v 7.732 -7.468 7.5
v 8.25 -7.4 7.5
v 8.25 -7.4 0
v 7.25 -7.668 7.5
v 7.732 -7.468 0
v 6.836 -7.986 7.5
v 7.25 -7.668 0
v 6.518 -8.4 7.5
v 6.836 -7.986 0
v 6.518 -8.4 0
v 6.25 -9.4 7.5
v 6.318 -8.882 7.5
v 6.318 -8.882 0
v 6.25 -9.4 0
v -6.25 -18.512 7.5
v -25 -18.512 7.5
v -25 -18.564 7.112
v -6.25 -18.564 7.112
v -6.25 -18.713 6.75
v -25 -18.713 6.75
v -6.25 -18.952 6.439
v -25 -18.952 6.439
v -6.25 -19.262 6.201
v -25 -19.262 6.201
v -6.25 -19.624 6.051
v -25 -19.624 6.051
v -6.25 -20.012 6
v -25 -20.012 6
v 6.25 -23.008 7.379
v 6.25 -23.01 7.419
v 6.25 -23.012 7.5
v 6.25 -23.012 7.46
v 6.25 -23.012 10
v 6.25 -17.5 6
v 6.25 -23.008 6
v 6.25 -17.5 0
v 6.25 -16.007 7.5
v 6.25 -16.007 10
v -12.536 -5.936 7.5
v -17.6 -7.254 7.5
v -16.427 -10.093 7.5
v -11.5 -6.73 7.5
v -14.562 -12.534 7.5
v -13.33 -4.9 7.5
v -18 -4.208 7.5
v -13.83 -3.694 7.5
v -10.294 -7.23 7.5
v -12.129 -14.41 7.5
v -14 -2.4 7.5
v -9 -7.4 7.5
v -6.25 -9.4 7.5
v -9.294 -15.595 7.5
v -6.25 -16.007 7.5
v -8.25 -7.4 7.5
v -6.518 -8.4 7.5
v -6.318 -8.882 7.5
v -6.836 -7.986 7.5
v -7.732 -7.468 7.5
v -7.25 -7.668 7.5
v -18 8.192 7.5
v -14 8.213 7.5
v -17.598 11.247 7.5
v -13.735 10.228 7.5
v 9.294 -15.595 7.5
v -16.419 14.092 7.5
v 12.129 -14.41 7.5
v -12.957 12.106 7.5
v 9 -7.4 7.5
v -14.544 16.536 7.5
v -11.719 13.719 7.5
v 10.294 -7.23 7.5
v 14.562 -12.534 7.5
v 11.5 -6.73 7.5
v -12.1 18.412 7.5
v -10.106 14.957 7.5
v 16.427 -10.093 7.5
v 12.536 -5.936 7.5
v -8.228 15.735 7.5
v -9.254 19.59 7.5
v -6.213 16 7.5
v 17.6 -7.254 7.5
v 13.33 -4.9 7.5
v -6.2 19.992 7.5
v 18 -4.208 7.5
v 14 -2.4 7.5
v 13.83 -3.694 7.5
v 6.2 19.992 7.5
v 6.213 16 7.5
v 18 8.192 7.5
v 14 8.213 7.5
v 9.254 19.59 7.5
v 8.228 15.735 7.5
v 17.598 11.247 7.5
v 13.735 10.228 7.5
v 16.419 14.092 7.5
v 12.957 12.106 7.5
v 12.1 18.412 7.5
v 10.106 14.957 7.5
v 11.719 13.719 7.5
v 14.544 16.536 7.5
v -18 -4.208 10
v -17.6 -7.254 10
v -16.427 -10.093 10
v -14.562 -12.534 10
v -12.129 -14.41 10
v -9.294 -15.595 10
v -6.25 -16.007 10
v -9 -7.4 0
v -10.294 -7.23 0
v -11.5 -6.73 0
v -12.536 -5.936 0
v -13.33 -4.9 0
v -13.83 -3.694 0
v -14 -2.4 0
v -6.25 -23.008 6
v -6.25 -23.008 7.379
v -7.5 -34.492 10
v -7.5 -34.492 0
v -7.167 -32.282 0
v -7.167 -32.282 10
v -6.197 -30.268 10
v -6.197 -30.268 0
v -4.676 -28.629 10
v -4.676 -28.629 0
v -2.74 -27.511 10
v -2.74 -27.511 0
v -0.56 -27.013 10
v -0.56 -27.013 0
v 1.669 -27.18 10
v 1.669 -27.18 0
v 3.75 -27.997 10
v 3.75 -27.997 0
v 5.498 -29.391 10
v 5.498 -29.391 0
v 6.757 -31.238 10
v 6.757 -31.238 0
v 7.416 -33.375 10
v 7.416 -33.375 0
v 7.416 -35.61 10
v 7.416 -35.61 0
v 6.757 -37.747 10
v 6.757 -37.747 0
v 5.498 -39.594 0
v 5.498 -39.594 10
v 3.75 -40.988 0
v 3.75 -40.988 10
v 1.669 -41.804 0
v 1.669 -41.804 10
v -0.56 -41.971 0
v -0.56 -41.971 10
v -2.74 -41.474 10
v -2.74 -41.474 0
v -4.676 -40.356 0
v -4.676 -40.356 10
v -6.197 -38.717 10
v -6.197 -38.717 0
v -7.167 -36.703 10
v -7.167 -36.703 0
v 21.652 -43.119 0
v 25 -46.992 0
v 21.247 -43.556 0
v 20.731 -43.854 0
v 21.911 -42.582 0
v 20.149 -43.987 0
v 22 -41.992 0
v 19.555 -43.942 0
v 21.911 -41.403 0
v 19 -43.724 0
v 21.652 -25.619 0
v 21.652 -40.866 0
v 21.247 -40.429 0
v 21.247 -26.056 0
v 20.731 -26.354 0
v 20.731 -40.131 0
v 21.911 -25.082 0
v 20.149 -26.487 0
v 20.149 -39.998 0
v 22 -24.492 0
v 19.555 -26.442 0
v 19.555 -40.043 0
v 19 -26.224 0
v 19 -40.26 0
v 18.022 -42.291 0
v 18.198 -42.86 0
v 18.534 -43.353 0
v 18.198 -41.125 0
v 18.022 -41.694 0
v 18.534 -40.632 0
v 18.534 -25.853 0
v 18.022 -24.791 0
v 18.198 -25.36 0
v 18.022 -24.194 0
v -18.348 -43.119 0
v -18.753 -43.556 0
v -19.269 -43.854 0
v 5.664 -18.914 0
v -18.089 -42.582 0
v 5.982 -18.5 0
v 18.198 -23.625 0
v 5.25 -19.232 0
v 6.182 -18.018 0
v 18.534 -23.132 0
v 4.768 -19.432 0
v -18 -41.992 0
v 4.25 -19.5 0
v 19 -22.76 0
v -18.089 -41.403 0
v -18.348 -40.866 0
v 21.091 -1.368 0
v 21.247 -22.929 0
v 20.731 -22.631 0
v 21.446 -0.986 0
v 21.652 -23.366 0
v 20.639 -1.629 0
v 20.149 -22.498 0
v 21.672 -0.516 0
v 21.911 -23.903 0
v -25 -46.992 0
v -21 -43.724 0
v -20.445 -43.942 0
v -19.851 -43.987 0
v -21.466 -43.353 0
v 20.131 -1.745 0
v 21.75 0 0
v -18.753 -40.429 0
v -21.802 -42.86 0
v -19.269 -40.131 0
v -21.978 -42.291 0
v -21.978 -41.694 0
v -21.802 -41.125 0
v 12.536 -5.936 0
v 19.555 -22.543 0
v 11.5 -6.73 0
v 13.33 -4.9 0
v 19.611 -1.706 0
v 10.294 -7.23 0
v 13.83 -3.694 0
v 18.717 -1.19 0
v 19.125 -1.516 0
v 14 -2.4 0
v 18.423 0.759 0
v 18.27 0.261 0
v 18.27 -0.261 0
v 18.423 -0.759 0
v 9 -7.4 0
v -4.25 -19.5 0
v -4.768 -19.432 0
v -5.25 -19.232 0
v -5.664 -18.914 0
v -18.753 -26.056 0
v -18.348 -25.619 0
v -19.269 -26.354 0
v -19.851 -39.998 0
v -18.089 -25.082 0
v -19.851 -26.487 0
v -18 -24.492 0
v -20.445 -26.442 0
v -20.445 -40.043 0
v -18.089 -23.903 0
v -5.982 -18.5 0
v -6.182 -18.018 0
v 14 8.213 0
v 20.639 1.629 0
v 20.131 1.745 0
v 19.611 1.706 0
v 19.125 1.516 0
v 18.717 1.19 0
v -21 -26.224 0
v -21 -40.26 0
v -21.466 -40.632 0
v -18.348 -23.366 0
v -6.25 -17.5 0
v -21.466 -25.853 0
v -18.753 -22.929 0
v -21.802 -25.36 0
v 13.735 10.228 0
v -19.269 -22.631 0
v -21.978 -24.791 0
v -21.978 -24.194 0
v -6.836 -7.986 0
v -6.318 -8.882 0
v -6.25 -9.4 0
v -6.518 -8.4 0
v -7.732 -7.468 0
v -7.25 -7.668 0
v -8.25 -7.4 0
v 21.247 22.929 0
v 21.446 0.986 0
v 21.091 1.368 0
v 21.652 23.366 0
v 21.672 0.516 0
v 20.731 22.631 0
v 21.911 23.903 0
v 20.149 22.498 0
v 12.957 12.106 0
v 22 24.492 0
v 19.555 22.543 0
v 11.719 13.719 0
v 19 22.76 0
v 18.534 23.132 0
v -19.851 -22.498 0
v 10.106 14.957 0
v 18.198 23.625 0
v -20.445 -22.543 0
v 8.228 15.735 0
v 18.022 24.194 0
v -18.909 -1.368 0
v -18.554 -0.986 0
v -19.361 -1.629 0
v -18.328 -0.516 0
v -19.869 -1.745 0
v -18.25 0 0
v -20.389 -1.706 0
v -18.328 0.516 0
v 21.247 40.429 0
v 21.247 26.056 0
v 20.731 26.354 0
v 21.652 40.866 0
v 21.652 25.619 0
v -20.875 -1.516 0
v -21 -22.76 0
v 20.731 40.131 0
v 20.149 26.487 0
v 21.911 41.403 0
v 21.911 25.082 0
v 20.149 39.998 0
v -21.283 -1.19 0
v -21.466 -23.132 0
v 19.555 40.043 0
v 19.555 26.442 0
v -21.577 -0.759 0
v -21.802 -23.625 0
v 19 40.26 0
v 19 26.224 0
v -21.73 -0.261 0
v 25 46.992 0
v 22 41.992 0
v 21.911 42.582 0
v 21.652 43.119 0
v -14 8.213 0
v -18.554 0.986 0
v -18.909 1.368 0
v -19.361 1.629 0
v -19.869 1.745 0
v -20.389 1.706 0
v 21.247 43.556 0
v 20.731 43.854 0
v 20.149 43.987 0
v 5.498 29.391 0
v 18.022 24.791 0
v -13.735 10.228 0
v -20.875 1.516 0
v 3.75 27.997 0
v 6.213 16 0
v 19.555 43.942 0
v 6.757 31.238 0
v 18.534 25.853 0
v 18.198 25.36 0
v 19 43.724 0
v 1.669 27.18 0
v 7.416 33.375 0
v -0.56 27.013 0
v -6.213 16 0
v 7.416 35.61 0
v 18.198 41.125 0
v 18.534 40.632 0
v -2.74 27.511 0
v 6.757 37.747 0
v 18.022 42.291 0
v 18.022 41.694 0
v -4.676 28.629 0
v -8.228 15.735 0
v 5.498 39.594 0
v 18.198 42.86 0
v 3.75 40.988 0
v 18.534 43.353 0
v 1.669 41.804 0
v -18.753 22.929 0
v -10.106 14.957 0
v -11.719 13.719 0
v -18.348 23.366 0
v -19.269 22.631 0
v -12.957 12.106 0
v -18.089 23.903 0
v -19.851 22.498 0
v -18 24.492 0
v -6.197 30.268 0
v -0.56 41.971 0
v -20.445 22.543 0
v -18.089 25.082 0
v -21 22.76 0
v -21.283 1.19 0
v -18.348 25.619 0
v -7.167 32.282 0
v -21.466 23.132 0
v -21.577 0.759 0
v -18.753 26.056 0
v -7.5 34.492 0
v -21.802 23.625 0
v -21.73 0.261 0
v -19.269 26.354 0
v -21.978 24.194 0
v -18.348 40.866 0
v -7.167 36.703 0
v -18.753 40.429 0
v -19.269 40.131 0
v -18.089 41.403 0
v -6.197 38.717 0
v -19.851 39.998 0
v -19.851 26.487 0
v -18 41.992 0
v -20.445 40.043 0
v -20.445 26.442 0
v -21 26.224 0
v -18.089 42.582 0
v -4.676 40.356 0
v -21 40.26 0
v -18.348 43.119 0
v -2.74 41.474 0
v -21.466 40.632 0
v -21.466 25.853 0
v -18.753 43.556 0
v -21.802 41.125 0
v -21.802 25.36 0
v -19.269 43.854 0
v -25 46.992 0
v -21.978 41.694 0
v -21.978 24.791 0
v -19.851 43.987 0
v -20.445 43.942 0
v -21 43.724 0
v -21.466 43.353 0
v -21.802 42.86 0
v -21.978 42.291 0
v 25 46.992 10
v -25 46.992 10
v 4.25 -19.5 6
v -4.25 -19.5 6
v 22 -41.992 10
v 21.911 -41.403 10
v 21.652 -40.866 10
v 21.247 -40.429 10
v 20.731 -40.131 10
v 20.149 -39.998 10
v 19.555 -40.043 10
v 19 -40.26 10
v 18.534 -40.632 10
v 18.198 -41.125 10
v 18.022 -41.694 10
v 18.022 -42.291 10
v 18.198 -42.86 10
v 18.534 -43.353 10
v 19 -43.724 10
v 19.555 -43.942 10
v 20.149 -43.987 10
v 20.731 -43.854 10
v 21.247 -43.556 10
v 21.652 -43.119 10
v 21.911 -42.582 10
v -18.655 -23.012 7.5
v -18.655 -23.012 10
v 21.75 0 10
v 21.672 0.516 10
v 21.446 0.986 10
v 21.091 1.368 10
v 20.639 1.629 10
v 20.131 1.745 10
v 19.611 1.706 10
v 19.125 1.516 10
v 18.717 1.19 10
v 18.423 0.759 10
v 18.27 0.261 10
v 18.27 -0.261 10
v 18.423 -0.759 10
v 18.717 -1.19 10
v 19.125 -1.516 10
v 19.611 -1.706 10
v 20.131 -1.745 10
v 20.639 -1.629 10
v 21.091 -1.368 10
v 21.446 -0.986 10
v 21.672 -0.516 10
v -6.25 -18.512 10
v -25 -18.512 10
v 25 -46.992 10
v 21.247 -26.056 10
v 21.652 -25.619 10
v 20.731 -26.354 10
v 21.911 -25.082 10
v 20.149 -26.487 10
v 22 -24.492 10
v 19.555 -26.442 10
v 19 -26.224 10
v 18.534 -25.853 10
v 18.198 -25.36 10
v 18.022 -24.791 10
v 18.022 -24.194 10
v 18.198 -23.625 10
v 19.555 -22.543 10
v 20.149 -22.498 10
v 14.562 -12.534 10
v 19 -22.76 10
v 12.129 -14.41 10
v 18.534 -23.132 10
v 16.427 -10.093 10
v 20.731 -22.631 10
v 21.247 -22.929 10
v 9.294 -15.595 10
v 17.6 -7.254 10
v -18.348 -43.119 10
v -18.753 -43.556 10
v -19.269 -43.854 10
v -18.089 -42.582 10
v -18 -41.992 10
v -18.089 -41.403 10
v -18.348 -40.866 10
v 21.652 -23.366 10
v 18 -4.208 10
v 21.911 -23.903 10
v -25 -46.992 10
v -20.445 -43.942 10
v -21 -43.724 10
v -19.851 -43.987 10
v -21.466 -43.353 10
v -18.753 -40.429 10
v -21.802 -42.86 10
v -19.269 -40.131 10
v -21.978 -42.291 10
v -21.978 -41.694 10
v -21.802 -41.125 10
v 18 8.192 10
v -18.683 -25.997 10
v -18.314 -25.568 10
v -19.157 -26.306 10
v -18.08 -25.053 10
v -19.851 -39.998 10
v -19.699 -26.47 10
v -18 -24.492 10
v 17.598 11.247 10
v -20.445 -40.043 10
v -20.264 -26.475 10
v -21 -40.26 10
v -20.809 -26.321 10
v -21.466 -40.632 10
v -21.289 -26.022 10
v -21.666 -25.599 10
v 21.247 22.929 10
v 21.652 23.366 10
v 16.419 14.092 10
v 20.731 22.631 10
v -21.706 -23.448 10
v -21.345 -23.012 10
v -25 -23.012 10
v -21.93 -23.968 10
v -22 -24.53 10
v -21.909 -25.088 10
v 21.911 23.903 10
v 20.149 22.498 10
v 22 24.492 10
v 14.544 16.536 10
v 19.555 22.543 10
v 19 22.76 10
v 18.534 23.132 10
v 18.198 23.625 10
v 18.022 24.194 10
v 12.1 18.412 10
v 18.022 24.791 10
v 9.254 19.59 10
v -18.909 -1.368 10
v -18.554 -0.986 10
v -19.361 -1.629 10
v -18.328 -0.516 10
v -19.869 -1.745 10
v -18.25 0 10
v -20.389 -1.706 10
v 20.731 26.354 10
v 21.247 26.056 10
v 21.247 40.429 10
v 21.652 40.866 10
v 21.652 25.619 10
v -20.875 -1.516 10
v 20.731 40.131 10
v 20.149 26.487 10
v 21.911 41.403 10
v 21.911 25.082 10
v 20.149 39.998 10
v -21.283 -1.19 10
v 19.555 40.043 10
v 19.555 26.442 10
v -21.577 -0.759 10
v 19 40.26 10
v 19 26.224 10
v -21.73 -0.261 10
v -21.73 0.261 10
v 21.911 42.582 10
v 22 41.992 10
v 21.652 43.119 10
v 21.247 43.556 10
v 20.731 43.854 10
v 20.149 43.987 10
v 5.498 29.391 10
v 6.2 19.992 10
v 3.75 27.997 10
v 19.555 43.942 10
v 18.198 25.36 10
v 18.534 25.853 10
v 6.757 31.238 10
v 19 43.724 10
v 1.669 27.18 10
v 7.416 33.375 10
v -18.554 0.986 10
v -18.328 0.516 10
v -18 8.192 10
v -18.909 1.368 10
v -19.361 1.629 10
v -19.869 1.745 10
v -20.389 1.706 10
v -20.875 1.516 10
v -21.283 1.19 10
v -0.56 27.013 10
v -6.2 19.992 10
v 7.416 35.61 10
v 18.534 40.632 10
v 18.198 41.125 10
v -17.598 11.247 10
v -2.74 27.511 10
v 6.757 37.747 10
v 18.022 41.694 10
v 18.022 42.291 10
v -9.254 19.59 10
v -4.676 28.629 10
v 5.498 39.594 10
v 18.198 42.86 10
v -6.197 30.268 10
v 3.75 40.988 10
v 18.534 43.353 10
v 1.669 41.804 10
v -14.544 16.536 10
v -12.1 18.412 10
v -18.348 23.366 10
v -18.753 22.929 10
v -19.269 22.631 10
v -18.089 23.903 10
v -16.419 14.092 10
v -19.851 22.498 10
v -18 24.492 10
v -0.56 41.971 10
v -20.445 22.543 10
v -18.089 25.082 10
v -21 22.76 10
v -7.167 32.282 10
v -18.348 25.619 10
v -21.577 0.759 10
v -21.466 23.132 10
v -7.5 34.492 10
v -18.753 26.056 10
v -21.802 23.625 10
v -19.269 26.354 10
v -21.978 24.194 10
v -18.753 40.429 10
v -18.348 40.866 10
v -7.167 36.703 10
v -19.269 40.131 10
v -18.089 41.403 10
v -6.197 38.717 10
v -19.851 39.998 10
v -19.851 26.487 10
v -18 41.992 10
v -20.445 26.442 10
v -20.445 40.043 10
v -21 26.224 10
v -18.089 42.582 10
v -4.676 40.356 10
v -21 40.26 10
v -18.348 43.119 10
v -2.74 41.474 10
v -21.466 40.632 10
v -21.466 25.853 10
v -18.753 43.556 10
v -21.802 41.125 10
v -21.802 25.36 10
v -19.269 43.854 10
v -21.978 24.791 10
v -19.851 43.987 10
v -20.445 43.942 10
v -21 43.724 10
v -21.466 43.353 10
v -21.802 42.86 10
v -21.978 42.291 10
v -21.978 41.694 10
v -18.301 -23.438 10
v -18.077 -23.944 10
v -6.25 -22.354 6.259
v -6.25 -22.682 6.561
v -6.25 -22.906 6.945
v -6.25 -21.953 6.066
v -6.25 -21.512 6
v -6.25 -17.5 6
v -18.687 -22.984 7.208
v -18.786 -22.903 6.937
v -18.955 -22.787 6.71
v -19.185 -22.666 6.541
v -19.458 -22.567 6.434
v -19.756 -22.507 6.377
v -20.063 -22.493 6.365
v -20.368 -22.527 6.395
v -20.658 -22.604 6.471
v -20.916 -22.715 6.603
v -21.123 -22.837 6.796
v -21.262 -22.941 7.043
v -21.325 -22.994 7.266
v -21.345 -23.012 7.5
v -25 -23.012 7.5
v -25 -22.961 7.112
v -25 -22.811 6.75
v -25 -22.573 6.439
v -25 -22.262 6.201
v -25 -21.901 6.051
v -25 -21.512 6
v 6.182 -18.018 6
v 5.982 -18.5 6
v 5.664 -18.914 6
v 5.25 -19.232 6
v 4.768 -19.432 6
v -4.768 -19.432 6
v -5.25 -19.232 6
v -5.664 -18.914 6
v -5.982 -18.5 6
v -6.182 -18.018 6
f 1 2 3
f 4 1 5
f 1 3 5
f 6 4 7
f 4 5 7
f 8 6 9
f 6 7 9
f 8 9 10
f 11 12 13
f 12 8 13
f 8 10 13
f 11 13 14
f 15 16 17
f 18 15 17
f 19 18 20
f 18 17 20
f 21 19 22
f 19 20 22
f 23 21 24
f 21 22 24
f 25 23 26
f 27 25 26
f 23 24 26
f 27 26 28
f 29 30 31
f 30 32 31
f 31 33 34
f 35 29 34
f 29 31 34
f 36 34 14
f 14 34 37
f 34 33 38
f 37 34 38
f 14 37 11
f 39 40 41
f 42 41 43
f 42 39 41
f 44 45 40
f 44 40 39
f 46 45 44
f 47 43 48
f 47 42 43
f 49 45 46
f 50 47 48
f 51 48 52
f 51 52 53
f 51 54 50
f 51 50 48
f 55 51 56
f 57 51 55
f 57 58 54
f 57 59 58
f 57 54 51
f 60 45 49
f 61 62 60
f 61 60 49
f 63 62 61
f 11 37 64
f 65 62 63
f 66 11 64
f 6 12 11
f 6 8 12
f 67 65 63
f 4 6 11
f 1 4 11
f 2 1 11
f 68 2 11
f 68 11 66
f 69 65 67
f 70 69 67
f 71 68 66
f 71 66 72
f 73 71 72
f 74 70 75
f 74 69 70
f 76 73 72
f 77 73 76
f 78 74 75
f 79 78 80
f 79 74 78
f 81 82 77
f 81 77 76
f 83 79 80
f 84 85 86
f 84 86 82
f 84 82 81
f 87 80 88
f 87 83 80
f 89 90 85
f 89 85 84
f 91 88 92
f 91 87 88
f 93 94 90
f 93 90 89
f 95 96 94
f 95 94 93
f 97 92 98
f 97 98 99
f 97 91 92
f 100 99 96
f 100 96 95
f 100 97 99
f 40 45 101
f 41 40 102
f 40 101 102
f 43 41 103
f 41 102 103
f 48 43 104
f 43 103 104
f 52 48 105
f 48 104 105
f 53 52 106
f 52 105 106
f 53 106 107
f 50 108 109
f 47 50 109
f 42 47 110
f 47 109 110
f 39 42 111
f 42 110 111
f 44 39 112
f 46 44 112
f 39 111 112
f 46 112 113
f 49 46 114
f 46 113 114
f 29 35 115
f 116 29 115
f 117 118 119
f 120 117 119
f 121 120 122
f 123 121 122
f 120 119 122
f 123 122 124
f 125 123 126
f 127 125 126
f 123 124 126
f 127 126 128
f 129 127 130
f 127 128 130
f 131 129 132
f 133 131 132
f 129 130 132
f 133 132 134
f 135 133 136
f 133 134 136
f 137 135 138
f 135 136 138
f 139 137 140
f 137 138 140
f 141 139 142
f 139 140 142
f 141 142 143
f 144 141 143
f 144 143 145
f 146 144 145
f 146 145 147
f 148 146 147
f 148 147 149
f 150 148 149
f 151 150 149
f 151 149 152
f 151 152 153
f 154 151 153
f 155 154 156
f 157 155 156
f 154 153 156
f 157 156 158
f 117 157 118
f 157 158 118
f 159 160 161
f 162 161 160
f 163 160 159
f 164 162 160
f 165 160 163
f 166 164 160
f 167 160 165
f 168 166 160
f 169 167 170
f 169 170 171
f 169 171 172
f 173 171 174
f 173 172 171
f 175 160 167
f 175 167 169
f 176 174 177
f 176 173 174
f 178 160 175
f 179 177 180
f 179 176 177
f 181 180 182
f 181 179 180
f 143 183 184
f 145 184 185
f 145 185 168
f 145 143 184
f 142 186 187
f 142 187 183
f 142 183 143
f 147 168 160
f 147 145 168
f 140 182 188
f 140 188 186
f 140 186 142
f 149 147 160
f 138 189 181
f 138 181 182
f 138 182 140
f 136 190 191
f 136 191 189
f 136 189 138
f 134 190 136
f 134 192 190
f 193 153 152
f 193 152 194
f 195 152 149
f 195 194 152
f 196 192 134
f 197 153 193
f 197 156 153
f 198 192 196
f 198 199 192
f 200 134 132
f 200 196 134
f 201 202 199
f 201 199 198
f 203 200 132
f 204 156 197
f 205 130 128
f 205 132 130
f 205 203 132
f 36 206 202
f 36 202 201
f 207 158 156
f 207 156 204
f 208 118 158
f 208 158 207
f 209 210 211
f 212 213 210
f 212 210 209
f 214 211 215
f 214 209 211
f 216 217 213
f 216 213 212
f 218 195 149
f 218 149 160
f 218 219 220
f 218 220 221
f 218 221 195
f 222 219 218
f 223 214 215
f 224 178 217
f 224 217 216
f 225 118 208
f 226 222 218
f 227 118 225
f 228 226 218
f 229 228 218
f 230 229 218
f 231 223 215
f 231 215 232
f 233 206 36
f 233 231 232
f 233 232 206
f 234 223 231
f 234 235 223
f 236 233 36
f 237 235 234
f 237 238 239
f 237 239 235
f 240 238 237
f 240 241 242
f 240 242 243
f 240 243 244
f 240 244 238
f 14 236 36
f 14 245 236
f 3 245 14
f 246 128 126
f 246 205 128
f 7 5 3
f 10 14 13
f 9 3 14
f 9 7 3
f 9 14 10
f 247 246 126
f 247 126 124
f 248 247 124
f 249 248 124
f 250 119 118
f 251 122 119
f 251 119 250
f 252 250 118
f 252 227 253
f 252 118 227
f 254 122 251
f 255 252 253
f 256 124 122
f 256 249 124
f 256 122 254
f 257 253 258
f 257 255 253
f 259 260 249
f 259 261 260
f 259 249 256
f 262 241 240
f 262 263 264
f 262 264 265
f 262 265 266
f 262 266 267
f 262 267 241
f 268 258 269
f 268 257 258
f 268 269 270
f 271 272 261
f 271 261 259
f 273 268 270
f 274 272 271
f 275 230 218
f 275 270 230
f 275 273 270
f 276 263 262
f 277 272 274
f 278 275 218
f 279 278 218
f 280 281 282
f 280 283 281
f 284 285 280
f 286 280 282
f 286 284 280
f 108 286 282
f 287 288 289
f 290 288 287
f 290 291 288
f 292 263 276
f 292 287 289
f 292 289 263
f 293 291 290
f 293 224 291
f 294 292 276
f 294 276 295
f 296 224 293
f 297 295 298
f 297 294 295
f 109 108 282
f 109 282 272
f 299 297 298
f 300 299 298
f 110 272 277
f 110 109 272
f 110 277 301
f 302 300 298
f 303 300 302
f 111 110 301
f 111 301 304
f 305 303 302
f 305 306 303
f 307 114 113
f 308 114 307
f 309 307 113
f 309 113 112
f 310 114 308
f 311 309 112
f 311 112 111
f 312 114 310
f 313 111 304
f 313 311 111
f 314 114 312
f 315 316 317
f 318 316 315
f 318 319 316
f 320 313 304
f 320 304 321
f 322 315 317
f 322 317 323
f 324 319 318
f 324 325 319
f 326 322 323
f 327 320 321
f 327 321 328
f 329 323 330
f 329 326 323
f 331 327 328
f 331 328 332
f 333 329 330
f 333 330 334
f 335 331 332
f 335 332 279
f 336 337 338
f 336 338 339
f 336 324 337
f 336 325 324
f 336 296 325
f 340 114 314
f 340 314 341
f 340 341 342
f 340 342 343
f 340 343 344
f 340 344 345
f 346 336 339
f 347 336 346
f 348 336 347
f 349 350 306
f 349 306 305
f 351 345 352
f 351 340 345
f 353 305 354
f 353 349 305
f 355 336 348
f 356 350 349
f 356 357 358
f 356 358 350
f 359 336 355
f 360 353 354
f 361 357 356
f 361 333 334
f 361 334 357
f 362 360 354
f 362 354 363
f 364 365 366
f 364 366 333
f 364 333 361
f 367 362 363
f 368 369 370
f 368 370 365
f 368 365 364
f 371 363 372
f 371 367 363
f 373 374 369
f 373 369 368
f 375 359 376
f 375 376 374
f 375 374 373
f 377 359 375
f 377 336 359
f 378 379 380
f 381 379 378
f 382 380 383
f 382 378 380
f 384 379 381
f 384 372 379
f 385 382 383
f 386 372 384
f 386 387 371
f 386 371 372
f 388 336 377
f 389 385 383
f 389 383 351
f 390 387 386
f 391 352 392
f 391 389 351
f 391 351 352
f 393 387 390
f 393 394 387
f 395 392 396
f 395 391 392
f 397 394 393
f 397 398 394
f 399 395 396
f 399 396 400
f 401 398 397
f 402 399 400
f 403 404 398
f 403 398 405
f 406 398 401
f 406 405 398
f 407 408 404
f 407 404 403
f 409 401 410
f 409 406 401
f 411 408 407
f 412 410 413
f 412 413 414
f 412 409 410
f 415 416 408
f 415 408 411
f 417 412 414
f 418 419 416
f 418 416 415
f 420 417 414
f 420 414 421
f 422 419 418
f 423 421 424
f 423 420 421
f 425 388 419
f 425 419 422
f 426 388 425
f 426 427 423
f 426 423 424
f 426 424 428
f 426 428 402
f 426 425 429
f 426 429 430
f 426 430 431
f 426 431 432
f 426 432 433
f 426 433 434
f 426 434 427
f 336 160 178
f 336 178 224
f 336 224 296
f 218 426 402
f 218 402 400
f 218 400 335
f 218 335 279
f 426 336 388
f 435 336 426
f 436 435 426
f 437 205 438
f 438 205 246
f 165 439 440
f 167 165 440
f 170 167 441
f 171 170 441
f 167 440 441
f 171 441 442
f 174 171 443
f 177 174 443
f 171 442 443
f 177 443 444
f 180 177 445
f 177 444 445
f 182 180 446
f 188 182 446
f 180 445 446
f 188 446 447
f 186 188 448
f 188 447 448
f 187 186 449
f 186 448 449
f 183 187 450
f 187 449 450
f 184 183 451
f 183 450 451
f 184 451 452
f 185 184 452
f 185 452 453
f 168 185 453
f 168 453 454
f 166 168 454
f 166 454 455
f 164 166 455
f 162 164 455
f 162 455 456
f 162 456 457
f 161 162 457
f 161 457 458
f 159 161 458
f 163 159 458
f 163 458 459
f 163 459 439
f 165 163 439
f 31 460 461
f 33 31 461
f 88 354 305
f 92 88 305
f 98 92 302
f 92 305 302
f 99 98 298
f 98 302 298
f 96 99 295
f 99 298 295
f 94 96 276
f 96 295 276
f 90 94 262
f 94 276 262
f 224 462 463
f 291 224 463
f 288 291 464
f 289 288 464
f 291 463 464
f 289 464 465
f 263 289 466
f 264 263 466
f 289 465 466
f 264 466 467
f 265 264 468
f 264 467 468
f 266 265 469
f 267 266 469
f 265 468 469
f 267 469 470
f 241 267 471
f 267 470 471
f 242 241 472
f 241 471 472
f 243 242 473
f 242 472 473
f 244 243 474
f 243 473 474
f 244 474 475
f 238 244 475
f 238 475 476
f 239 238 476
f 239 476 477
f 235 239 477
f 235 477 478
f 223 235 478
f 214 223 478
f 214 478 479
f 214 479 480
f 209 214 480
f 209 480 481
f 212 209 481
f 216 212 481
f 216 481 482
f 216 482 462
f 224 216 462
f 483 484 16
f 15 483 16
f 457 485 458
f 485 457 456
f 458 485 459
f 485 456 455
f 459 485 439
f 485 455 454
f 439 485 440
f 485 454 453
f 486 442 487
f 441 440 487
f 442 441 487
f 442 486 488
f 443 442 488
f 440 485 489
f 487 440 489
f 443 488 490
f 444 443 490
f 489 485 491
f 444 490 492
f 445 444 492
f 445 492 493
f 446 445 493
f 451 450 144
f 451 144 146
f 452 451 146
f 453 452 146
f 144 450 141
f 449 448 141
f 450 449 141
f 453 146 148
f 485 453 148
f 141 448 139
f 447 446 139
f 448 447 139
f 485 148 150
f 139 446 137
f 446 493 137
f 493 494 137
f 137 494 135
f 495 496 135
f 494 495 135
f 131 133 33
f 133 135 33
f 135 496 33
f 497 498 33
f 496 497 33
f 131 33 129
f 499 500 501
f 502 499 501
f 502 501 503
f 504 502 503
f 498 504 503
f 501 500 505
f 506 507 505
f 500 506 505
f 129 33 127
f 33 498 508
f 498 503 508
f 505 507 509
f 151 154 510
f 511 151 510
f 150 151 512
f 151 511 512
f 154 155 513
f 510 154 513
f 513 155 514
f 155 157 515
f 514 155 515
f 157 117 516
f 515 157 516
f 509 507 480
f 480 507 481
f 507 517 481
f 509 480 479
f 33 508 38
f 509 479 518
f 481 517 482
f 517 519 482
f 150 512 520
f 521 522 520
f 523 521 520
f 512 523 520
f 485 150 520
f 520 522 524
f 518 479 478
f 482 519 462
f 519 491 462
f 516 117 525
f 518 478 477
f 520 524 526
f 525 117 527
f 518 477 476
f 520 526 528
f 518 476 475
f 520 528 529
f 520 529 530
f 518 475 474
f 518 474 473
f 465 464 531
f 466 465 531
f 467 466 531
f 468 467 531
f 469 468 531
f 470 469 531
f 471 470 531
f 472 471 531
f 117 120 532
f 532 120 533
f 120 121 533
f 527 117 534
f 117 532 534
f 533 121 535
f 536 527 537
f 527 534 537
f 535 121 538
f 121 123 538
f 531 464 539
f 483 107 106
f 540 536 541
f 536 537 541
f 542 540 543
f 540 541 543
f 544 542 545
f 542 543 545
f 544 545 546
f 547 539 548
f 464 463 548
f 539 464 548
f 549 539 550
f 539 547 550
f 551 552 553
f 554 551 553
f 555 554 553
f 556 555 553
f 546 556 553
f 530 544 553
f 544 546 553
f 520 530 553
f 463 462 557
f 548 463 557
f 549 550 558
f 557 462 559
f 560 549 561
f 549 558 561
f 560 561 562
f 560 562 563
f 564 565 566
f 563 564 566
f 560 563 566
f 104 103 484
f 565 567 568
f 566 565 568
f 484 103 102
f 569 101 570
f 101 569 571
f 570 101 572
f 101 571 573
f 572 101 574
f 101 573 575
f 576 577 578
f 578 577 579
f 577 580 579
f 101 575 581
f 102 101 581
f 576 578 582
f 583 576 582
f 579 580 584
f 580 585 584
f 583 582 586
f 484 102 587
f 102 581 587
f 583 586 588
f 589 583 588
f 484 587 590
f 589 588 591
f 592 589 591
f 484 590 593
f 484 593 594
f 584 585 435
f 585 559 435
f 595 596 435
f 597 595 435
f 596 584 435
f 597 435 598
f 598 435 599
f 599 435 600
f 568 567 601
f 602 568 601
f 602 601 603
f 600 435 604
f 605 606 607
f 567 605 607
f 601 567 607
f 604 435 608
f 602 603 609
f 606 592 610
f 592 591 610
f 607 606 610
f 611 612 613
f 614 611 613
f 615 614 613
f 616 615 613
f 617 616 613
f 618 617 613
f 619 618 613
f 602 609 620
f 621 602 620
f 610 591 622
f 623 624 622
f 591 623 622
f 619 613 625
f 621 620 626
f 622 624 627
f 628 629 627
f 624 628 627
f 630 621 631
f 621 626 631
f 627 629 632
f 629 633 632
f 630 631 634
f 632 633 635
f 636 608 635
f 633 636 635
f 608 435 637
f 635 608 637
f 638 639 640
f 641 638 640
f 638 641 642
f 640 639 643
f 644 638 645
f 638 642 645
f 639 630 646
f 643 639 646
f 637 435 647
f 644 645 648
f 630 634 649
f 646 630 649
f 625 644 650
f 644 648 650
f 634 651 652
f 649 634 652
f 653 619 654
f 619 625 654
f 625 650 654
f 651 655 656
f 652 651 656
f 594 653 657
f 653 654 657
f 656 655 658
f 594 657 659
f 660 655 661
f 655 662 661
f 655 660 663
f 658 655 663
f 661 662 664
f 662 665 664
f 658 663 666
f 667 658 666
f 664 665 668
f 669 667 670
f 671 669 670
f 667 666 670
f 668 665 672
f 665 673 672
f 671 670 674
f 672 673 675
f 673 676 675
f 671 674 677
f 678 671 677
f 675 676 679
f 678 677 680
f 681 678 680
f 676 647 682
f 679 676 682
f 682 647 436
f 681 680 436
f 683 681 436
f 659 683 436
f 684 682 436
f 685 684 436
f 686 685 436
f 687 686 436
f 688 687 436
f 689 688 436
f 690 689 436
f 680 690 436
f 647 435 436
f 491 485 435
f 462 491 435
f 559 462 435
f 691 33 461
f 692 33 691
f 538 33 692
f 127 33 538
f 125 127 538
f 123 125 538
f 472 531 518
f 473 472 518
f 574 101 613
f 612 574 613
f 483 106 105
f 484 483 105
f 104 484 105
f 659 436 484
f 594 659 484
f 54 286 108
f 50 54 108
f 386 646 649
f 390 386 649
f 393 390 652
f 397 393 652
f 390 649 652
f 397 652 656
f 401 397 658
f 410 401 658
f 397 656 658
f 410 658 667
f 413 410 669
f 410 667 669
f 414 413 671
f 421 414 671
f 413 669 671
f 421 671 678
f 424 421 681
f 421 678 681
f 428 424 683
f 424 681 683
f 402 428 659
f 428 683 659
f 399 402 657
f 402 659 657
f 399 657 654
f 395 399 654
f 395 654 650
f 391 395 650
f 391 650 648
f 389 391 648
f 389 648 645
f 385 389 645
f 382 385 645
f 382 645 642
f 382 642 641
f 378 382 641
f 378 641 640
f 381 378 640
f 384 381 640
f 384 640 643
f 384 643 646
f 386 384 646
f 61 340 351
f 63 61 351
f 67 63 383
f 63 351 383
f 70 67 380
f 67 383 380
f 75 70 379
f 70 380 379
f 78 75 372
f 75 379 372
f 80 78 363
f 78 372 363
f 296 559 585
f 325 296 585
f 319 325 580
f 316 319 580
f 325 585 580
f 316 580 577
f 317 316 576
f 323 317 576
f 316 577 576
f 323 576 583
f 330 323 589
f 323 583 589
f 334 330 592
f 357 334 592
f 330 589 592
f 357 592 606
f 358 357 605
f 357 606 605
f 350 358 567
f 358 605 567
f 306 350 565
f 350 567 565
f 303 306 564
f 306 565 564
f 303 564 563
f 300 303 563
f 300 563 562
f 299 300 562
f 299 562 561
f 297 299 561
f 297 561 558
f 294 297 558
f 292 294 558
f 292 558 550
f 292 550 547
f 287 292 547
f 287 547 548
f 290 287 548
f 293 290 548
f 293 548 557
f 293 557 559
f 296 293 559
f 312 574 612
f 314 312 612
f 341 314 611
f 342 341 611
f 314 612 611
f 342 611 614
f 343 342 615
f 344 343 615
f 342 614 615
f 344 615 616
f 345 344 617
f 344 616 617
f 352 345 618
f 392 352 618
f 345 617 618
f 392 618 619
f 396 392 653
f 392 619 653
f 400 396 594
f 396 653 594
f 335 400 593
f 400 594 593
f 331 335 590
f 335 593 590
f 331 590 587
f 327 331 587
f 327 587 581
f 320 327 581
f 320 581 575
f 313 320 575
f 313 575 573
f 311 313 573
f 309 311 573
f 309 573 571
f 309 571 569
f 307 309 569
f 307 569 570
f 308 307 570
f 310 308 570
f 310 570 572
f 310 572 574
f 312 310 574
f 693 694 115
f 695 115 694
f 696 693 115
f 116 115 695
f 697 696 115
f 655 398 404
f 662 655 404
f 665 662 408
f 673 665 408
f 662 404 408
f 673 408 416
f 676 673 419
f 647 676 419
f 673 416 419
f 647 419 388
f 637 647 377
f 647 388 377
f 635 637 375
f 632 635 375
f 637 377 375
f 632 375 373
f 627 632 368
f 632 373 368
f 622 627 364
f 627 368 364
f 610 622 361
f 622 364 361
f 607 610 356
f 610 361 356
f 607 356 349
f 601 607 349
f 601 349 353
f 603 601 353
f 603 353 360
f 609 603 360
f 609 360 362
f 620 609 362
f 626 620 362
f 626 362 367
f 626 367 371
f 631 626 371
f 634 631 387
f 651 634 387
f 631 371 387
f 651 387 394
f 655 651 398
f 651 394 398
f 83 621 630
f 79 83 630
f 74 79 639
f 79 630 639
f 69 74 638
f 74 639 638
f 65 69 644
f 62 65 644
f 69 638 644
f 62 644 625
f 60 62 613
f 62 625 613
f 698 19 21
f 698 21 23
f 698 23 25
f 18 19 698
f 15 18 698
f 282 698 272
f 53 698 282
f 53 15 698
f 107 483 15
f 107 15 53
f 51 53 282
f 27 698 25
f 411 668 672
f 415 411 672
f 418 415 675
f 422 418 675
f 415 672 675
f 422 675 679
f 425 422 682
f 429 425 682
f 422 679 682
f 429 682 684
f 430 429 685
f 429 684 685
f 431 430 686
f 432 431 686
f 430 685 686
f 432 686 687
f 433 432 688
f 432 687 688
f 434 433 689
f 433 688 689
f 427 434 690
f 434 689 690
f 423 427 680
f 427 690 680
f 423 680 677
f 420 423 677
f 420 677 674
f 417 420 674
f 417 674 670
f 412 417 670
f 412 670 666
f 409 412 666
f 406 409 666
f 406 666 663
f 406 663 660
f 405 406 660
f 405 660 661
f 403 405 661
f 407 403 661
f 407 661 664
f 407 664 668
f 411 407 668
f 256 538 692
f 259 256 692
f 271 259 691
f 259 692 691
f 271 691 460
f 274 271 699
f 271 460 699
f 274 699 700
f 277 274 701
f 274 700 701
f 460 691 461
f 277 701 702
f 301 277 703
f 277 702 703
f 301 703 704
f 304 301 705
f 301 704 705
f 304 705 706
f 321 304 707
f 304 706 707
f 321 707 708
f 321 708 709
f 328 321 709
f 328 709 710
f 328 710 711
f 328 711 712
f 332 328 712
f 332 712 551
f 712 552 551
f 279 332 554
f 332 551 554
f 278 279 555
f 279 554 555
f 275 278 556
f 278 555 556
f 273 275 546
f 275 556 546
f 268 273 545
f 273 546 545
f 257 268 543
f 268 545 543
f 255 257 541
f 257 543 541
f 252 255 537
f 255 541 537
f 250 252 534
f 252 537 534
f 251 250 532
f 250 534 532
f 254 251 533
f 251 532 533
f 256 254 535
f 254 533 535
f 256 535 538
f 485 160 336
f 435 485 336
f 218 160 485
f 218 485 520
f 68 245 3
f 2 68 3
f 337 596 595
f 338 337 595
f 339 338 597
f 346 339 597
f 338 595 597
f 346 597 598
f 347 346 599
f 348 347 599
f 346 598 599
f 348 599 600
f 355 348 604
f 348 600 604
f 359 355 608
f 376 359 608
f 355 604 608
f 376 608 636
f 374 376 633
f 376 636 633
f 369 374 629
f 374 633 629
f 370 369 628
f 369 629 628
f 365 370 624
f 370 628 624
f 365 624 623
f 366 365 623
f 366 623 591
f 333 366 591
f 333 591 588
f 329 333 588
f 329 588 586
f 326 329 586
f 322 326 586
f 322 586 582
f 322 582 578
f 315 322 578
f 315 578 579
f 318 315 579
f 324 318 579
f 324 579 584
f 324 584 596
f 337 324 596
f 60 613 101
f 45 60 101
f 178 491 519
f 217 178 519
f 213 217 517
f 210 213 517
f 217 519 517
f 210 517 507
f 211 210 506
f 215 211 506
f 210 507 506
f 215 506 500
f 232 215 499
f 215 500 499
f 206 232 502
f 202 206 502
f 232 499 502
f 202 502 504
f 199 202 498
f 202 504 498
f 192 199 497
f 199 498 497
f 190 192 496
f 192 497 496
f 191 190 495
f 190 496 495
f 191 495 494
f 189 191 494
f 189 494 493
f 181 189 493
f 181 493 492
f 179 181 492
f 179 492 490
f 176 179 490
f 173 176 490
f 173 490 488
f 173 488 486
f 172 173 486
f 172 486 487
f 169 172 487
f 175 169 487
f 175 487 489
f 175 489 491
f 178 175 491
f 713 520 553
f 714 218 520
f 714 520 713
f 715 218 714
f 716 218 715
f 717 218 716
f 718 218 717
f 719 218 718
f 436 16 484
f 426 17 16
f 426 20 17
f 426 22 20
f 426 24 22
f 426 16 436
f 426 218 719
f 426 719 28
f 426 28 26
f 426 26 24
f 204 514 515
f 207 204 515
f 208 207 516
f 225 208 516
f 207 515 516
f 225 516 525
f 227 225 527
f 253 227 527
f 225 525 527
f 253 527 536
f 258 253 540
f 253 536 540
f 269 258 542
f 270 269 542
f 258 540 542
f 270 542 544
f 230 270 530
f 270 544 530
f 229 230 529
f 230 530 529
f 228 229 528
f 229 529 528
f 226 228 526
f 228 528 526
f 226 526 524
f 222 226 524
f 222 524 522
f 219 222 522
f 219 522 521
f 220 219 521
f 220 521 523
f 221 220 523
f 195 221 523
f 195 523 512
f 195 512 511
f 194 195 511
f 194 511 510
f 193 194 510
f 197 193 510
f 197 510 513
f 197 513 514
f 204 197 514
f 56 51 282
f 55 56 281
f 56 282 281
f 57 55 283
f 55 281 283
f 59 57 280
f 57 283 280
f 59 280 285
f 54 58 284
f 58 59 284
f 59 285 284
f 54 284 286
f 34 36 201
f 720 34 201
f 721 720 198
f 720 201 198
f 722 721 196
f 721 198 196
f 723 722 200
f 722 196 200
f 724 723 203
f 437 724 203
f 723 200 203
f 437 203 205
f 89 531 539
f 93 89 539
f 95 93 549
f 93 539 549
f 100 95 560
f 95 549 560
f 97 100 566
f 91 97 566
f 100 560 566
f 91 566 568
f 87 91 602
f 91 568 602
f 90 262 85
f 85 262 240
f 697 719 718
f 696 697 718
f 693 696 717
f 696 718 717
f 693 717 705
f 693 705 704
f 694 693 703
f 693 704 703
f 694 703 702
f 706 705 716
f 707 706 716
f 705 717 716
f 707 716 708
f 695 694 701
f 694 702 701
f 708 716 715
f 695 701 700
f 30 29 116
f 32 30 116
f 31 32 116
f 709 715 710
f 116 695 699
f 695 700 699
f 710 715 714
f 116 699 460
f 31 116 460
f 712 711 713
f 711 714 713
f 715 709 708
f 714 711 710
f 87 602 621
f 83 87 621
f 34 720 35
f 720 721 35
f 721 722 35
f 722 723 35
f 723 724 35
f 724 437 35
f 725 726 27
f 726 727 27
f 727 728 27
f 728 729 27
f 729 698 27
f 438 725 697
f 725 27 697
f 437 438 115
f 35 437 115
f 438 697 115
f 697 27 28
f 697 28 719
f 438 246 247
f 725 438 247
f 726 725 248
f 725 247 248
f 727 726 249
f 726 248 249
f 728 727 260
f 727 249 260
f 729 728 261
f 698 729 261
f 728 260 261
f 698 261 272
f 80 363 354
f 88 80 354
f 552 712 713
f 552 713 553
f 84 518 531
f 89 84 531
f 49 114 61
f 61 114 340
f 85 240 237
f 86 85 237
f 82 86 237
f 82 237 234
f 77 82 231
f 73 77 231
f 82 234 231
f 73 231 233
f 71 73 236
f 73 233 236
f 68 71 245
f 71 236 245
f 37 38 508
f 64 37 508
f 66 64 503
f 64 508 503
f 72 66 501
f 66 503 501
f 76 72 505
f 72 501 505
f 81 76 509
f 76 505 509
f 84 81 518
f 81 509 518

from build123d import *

# Parameters (mm, degrees)
BOSS_EXTRUDE1_DEPTH = 10
CUT_EXTRUDE1_DEPTH  = 11
SKETCH3_W           = 50
SKETCH3_H           = 45
BOSS_EXTRUDE3_DEPTH = 10
CUT_EXTRUDE6_DEPTH  = 2.5
SKETCH5_W           = 12.5
SKETCH5_H           = 6.253832763
CUT_EXTRUDE7_DEPTH  = 4
SKETCH6_W           = 50
SKETCH6_H           = 23.984880812
SKETCH6_R           = 7.5
SKETCH6_H_2         = 25
BOSS_EXTRUDE4_DEPTH = 10
CUT_EXTRUDE8_DEPTH  = 31.25
SKETCH8_R           = 2
SKETCH8_R_2         = 1.75
CUT_EXTRUDE11_DEPTH = 11
SKETCH9_R           = 2
CUT_EXTRUDE12_DEPTH = 11


with BuildPart() as part:
    # Sketch1 → Boss-Extrude1 (new body)
    with BuildSketch(Plane.XY):
        with BuildLine():
            Line((-7, 19), (7, 19))
            ThreePointArc((7, 19), (14.071067812, 16.071067812), (17, 9))
            Line((17, 9), (17, -5))
            ThreePointArc((17, -5), (14.071067812, -12.071067812), (7, -15))
            Line((7, -15), (-7, -15))
            ThreePointArc((-7, -15), (-14.071067812, -12.071067812), (-17, -5))
            Line((-17, -5), (-17, 9))
            ThreePointArc((-17, 9), (-14.071067812, 16.071067812), (-7, 19))
        make_face()
    extrude(amount=BOSS_EXTRUDE1_DEPTH)

    # Sketch2 → Cut-Extrude1 (cut, through all)
    with BuildSketch(Plane(origin=(0, 0, 0), x_dir=(-1, 0, 0), z_dir=(0, 0, -1))):
        with BuildLine():
            Line((14, 0.39), (14, 8.212908396))
            ThreePointArc((14, 8.212908396), (11.719213675, 13.719213675), (6.212908396, 16))
            Line((6.212908396, 16), (-6.212908396, 16))
            ThreePointArc((-6.212908396, 16), (-11.719213675, 13.719213675), (-14, 8.212908396))
            Line((-14, 8.212908396), (-14, 0.39))
            Line((-14, 0.39), (-14, -2.4))
            ThreePointArc((-14, -2.4), (-12.535533906, -5.935533906), (-9, -7.4))
            Line((-9, -7.4), (-8.25, -7.4))
            ThreePointArc((-8.25, -7.4), (-6.835786438, -7.985786438), (-6.25, -9.4))
            Line((-6.25, -9.4), (-6.25, -17.62539529))
            Line((-6.25, -17.62539529), (6.25, -17.62539529))
            Line((6.25, -17.62539529), (6.25, -9.4))
            ThreePointArc((6.25, -9.4), (6.835786438, -7.985786438), (8.25, -7.4))
            Line((8.25, -7.4), (9, -7.4))
            ThreePointArc((9, -7.4), (12.535533906, -5.935533906), (14, -2.4))
            Line((14, -2.4), (14, 0.39))
        make_face()
    extrude(amount=-CUT_EXTRUDE1_DEPTH, mode=Mode.SUBTRACT)

    # Sketch3 → Boss-Extrude3 (add)
    with BuildSketch(Plane(origin=(0, 0, 0), x_dir=(-1, 0, 0), z_dir=(0, 0, -1))):
        with Locations((0, -0.507559594)):
            Rectangle(SKETCH3_W, SKETCH3_H)
        with BuildLine():
            Line((-6.25, -9.4), (-6.25, -15))
            Line((-6.25, -15), (-6.25, -17.5))
            ThreePointArc((-6.25, -17.5), (-5.664213562, -18.914213562), (-4.25, -19.5))
            Line((-4.25, -19.5), (4.25, -19.5))
            ThreePointArc((4.25, -19.5), (5.664213562, -18.914213562), (6.25, -17.5))
            Line((6.25, -17.5), (6.25, -15))
            Line((6.25, -15), (6.25, -9.4))
            ThreePointArc((6.25, -9.4), (6.835786438, -7.985786438), (8.25, -7.4))
            Line((8.25, -7.4), (9, -7.4))
            ThreePointArc((9, -7.4), (12.535533906, -5.935533906), (14, -2.4))
            Line((14, -2.4), (14, 8.212908396))
            ThreePointArc((14, 8.212908396), (11.719213675, 13.719213675), (6.212908396, 16))
            Line((6.212908396, 16), (-6.212908396, 16))
            ThreePointArc((-6.212908396, 16), (-11.719213675, 13.719213675), (-14, 8.212908396))
            Line((-14, 8.212908396), (-14, -2.4))
            ThreePointArc((-14, -2.4), (-12.535533906, -5.935533906), (-9, -7.4))
            Line((-9, -7.4), (-8.25, -7.4))
            ThreePointArc((-8.25, -7.4), (-6.835786438, -7.985786438), (-6.25, -9.4))
        make_face(mode=Mode.SUBTRACT)
    extrude(amount=-BOSS_EXTRUDE3_DEPTH)

    # Sketch4 → Cut-Extrude6 (cut)
    with BuildSketch(Plane.XY.offset(10)):
        with BuildLine():
            Line((-18, 8.192440406), (-18, -4.207559594))
            ThreePointArc((-18, -4.207559594), (-14.543860018, -12.551419612), (-6.2, -16.007559594))
            Line((-6.2, -16.007559594), (6.2, -16.007559594))
            ThreePointArc((6.2, -16.007559594), (14.543860018, -12.551419612), (18, -4.207559594))
            Line((18, -4.207559594), (18, 8.192440406))
            ThreePointArc((18, 8.192440406), (14.543860018, 16.536300424), (6.2, 19.992440406))
            Line((6.2, 19.992440406), (-6.2, 19.992440406))
            ThreePointArc((-6.2, 19.992440406), (-14.543860018, 16.536300424), (-18, 8.192440406))
        make_face()
    extrude(amount=-CUT_EXTRUDE6_DEPTH, mode=Mode.SUBTRACT)

    # Sketch5 → Cut-Extrude7 (cut)
    with BuildSketch(Plane.XY.offset(10)):
        with Locations((0, -19.880643213)):
            Rectangle(SKETCH5_W, SKETCH5_H)
    extrude(amount=-CUT_EXTRUDE7_DEPTH, mode=Mode.SUBTRACT)

    # Sketch6 → Boss-Extrude4 (add)
    with BuildSketch(Plane(origin=(0, 0, 0), x_dir=(-1, 0, 0), z_dir=(0, 0, -1))):
        with Locations((0, -35)):
            Rectangle(SKETCH6_W, SKETCH6_H)
        with Locations((0, -34.492440406)):
            Circle(SKETCH6_R, mode=Mode.SUBTRACT)
        with Locations((0, 34.492440406)):
            Rectangle(SKETCH6_W, SKETCH6_H_2)
        with Locations((0, 34.492440406)):
            Circle(SKETCH6_R, mode=Mode.SUBTRACT)
    extrude(amount=-BOSS_EXTRUDE4_DEPTH)

    # Sketch7 → Cut-Extrude8 (cut)
    with BuildSketch(Plane.ZY.offset(25)):
        with BuildLine():
            Line((10, -18.512440406), (7.5, -18.512440406))
            ThreePointArc((7.5, -18.512440406), (6.439339828, -18.951780234), (6, -20.012440406))
            Line((6, -20.012440406), (6, -21.512440406))
            ThreePointArc((6, -21.512440406), (6.439339828, -22.573100578), (7.5, -23.012440406))
            Line((7.5, -23.012440406), (10, -23.012440406))
            Line((10, -23.012440406), (10, -18.512440406))
        make_face()
    extrude(amount=-CUT_EXTRUDE8_DEPTH, mode=Mode.SUBTRACT)

    # Sketch8 → Cut-Extrude11 (cut, through all)
    with BuildSketch(Plane.XY.offset(10)):
        with Locations((-20, 41.992440406)):
            Circle(SKETCH8_R)
        with Locations((20, 41.992440406)):
            Circle(SKETCH8_R)
        with Locations((-20, 0)):
            Circle(SKETCH8_R_2)
        with Locations((20, 0)):
            Circle(SKETCH8_R_2)
        with Locations((20, -41.992440406)):
            Circle(SKETCH8_R)
        with Locations((-20, -41.992440406)):
            Circle(SKETCH8_R)
    extrude(amount=-CUT_EXTRUDE11_DEPTH, mode=Mode.SUBTRACT)

    # Sketch9 → Cut-Extrude12 (cut, through all)
    with BuildSketch(Plane.XY.offset(10)):
        with Locations((-20, 24.492440406)):
            Circle(SKETCH9_R)
        with Locations((20, 24.492440406)):
            Circle(SKETCH9_R)
        with Locations((20, -24.492440406)):
            Circle(SKETCH9_R)
        with Locations((-20, -24.492440406)):
            Circle(SKETCH9_R)
    extrude(amount=-CUT_EXTRUDE12_DEPTH, mode=Mode.SUBTRACT)


solid = part.part
